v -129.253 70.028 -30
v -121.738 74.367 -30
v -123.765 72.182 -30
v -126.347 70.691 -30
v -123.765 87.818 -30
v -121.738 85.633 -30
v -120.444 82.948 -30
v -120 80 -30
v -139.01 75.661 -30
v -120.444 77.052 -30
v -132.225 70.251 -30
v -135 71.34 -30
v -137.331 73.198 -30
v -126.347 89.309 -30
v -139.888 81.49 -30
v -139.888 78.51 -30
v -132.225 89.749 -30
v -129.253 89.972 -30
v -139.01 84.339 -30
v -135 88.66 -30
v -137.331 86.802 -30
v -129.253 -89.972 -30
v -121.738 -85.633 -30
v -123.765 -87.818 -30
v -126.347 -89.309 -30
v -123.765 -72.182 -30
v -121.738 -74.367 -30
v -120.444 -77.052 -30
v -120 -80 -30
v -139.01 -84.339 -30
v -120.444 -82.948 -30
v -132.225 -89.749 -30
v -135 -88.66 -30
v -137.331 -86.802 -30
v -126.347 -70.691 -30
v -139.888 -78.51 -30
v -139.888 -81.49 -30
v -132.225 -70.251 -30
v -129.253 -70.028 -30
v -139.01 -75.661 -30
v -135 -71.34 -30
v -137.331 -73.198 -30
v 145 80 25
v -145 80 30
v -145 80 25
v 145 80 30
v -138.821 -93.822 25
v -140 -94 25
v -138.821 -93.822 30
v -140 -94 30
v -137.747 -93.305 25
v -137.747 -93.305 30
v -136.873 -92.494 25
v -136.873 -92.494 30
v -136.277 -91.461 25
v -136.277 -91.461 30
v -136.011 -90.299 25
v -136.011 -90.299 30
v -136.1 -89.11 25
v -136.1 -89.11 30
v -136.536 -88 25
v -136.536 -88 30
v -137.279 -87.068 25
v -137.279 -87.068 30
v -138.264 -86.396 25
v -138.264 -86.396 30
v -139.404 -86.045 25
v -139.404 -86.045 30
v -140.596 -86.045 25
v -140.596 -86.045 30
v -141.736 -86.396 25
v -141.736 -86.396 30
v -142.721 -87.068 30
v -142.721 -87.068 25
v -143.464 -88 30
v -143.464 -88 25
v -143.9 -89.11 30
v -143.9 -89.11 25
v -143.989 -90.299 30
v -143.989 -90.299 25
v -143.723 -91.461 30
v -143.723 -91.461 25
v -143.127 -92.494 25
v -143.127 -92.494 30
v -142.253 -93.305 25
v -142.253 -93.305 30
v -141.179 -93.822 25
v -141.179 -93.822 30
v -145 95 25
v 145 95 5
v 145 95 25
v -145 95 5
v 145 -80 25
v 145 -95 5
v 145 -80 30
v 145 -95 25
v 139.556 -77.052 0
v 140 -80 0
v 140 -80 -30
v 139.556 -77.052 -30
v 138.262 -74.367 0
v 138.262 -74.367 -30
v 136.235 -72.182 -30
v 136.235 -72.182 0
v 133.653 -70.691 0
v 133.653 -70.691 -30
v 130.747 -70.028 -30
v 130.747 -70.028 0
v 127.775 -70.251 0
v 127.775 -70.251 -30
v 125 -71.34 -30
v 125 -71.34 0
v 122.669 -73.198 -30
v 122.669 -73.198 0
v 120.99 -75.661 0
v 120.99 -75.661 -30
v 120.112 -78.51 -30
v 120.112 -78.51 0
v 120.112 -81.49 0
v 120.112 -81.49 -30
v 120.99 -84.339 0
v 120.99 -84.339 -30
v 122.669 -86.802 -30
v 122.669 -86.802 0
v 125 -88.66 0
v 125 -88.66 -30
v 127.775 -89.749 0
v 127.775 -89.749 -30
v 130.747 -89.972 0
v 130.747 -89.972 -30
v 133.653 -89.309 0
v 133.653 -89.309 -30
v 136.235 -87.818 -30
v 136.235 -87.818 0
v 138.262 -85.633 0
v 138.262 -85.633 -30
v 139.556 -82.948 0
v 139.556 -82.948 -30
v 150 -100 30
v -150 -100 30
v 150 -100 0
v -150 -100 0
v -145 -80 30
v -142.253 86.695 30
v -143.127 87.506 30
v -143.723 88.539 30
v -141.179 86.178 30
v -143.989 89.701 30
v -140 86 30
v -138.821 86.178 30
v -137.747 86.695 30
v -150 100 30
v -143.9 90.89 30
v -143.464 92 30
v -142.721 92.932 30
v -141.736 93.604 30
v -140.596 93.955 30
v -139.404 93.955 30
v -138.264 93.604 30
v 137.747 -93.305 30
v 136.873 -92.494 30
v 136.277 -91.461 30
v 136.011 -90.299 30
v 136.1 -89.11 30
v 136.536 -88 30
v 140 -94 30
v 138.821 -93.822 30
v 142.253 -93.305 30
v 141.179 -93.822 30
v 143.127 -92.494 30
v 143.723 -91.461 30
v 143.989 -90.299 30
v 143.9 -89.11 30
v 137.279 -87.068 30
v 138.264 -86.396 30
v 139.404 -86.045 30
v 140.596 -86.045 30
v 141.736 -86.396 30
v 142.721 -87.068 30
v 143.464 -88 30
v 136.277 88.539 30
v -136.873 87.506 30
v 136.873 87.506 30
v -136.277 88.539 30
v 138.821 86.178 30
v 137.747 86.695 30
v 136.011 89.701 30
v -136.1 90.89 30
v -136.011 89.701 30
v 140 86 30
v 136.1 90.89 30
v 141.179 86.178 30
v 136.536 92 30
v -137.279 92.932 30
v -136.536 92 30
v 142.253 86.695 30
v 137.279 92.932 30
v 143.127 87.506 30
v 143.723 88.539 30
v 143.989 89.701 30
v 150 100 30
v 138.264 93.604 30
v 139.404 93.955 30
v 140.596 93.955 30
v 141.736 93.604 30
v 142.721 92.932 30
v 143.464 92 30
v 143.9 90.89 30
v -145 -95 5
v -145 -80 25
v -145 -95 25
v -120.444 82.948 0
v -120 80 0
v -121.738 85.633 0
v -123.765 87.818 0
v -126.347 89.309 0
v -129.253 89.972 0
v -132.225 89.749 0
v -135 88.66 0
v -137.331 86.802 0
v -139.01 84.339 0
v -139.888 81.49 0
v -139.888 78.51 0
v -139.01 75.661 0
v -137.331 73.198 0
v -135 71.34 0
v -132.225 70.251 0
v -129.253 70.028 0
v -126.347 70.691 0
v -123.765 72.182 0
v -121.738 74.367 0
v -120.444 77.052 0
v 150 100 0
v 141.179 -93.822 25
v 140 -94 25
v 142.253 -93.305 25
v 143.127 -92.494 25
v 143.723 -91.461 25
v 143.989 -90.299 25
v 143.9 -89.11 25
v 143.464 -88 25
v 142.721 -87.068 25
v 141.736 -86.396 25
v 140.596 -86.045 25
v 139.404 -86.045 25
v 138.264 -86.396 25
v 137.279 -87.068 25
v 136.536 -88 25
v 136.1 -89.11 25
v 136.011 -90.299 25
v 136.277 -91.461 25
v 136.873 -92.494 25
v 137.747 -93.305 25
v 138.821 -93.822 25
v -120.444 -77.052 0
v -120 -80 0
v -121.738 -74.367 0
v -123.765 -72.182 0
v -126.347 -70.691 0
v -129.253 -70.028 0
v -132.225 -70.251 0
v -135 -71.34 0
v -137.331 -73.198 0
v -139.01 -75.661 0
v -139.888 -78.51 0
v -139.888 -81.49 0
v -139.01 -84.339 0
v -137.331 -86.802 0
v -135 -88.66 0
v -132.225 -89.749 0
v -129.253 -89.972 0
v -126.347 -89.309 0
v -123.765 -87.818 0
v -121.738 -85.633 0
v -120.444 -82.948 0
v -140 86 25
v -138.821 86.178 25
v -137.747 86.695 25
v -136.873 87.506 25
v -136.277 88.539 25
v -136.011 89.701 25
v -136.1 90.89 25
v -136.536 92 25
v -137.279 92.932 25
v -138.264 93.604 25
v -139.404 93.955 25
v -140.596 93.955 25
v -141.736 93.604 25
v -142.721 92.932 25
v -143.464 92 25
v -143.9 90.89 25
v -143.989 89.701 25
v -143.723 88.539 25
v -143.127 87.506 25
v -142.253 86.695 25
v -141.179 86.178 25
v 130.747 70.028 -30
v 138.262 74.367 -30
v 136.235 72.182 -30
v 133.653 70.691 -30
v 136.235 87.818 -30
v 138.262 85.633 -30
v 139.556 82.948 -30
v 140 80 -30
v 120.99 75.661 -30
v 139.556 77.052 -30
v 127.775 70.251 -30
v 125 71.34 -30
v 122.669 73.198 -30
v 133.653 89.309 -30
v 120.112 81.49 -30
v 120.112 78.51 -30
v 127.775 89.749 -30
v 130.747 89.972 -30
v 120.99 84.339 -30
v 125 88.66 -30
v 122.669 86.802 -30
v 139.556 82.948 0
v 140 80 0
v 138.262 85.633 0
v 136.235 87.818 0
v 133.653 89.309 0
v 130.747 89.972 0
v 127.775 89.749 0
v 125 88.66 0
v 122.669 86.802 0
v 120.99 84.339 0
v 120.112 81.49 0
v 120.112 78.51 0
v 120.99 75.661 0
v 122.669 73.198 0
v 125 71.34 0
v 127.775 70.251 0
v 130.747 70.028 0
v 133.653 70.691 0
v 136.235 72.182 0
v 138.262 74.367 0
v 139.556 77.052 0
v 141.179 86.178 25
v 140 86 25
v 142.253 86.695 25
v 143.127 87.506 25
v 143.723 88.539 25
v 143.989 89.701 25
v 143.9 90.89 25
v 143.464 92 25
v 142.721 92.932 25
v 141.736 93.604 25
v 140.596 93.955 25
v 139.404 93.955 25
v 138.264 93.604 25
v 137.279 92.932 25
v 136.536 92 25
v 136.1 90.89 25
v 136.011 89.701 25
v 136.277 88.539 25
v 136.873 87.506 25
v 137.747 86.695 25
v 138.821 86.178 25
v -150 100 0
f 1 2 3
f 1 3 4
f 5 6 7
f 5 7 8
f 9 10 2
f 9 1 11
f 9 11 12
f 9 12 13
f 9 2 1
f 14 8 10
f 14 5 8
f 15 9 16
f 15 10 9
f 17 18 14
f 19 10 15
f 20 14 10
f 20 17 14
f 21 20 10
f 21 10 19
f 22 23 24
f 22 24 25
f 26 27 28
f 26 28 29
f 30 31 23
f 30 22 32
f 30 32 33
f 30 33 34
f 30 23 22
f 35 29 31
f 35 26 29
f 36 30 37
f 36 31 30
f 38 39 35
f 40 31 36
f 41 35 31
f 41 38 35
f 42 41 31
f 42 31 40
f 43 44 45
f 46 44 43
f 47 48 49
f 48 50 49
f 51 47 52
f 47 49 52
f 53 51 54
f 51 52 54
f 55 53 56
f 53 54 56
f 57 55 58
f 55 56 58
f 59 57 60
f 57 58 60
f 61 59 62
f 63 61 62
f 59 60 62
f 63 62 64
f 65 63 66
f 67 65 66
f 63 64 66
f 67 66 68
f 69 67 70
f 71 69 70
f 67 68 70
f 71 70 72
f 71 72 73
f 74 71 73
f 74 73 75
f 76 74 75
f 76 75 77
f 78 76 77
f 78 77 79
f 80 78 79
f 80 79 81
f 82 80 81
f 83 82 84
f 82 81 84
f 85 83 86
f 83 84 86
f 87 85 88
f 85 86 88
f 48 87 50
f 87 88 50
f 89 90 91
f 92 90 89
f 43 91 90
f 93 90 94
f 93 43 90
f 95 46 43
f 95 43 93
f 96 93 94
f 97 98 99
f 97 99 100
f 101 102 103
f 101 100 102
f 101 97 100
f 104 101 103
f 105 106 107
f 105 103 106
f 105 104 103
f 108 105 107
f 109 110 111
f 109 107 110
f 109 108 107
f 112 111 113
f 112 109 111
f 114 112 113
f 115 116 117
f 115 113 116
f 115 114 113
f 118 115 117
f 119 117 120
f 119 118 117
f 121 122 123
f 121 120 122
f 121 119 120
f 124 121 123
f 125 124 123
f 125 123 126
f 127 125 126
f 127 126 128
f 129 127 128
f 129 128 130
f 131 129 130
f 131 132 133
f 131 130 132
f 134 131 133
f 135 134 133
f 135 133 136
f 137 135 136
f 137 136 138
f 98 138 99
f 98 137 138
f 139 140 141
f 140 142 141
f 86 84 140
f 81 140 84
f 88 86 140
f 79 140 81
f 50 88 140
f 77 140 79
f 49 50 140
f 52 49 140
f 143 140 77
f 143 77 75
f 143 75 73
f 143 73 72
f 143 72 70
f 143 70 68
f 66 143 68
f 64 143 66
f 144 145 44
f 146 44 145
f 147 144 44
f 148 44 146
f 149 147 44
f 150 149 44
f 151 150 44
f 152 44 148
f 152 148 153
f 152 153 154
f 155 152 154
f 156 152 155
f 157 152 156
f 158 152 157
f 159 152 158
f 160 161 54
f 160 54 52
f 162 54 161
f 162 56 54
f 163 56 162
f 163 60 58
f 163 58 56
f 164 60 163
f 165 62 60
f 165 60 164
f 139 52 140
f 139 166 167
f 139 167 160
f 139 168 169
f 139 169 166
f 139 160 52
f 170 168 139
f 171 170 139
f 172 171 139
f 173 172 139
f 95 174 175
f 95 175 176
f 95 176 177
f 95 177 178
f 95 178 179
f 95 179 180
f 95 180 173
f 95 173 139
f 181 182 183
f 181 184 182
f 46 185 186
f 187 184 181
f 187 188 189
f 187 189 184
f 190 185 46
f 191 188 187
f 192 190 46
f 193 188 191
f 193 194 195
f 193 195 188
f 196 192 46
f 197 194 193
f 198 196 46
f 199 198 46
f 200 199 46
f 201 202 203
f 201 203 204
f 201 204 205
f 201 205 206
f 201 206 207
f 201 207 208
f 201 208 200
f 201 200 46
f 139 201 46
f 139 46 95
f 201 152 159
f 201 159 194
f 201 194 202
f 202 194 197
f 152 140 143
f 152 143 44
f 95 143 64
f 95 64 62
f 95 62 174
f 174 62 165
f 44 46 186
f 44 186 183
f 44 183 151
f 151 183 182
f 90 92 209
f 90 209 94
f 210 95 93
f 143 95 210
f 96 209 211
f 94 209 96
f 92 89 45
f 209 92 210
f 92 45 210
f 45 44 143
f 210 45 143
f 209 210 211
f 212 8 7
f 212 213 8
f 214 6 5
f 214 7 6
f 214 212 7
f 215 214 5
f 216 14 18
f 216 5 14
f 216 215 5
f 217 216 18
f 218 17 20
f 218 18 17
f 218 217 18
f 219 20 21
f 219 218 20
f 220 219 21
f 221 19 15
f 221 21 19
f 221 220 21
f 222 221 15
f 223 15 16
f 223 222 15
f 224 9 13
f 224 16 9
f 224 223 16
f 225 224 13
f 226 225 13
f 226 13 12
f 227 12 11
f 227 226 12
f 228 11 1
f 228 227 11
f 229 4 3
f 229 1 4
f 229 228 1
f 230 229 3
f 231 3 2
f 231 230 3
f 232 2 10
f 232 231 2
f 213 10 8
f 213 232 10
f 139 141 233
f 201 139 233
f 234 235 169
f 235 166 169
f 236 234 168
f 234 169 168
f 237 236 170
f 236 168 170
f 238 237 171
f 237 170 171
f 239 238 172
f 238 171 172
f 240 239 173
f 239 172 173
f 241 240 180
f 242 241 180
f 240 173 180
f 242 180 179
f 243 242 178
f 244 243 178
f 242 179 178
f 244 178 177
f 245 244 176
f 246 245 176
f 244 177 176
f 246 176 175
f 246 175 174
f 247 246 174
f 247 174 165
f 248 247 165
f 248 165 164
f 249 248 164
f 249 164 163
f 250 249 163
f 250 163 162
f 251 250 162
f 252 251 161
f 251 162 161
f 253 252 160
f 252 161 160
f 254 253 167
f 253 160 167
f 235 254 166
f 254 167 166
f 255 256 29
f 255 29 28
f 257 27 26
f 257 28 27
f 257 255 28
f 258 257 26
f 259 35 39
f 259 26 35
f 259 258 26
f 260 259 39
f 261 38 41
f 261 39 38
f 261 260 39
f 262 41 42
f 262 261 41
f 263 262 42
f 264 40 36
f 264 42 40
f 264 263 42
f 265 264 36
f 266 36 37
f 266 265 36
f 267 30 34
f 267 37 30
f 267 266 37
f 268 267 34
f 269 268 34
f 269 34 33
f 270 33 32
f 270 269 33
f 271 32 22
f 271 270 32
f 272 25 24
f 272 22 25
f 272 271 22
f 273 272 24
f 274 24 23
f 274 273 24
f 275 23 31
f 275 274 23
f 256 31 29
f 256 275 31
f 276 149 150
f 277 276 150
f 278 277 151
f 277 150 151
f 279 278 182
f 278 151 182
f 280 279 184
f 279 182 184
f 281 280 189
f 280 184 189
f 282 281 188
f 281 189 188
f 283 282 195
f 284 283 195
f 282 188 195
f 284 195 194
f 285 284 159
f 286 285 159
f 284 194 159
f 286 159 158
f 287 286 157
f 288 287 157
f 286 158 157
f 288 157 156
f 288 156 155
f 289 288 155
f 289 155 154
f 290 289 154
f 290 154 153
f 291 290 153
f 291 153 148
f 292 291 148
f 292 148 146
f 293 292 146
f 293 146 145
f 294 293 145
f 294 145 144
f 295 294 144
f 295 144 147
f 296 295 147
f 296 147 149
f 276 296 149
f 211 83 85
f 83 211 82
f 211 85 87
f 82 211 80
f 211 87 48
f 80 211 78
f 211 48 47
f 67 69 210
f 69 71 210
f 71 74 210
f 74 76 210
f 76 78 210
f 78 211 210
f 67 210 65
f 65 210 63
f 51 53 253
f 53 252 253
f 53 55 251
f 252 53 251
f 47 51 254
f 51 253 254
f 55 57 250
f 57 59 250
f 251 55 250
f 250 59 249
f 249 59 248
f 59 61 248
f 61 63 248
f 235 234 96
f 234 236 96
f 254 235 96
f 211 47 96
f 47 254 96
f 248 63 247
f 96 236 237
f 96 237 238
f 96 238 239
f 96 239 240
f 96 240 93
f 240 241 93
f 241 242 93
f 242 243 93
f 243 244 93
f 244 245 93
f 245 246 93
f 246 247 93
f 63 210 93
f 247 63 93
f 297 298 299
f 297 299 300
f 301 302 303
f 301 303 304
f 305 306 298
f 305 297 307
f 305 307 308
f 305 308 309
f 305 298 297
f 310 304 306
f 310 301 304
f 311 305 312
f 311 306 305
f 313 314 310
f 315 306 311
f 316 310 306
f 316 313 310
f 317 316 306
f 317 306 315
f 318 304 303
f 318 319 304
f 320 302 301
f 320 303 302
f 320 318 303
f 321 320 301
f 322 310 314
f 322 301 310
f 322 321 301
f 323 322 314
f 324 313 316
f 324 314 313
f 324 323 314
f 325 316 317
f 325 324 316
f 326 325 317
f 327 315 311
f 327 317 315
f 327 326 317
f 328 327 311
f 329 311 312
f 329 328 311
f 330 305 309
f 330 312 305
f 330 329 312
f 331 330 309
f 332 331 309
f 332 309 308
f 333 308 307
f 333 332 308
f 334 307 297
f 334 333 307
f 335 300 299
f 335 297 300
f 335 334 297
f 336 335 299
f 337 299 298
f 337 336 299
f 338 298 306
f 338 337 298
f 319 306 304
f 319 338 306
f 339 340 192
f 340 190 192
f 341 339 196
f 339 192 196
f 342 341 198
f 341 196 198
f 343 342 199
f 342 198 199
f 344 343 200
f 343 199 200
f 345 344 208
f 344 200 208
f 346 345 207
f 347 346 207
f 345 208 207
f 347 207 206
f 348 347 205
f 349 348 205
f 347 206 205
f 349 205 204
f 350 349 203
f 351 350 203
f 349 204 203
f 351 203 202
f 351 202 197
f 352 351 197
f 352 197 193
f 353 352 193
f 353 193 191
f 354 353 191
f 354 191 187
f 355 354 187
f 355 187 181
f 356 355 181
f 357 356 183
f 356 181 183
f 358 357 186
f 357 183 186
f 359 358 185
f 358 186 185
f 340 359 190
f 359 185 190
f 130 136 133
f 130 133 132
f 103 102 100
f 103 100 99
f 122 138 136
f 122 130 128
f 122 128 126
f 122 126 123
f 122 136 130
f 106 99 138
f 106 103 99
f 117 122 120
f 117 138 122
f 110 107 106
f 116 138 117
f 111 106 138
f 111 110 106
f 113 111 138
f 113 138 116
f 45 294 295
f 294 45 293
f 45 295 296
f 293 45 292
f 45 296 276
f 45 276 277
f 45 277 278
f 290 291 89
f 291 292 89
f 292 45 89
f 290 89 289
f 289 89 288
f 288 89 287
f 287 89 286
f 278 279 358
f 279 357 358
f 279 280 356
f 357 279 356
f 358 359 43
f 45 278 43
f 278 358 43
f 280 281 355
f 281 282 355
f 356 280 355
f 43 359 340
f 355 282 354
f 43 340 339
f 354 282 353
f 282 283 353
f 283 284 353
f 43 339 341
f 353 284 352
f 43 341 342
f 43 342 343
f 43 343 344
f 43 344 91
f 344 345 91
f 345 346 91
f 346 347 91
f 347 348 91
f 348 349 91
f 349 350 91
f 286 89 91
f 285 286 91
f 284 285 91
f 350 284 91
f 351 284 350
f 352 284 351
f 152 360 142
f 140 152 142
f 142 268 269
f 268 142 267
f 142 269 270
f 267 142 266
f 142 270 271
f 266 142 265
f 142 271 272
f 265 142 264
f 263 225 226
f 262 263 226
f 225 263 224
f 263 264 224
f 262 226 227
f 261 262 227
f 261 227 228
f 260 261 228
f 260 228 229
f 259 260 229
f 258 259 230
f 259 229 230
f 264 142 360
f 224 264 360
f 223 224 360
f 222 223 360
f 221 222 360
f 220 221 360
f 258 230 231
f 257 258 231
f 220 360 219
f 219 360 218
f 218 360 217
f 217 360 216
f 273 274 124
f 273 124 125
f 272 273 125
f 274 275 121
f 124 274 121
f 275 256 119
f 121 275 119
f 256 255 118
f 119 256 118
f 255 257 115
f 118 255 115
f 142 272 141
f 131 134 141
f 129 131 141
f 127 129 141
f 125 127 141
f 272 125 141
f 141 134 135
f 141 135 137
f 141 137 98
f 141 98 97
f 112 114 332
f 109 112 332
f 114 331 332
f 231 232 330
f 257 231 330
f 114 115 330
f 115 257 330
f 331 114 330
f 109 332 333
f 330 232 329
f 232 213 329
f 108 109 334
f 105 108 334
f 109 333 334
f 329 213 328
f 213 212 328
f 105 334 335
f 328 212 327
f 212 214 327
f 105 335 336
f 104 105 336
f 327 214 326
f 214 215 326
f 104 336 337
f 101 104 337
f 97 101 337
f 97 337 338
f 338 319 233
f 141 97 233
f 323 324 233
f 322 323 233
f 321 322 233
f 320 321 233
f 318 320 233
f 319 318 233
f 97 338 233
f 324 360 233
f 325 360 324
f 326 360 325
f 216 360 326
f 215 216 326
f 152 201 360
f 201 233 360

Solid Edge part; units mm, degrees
sketch "Sketch1" plane through (0, 0, 0) normal (0, 0, 1) x (1, 0, 0)
  line L0 (-150, -100) -> (150, -100)
  line L1 (150, -100) -> (150, 100)
  line L2 (150, 100) -> (-150, 100)
  line L3 (-150, 100) -> (-150, -100)
  dimension "D1" = 300
  dimension "D2" = 200
extrude "Protrusion1" add sketch "Sketch1" along normal blind 5
sketch "Sketch2" plane through (0, 0, 0) normal (0, 0, -1) x (1, 0, 0)
  circle A0 centre (-130, 80) radius 10
  circle A1 centre (130, 80) radius 10
  circle A2 centre (130, -80) radius 10
  circle A3 centre (-130, -80) radius 10
  dimension "D1" = 20
  dimension "D2" = 20
  dimension "D3" = 20
  dimension "D4" = 20
  dimension "D5" = 20
  dimension "D6" = 20
  dimension "D7" = 20
  dimension "D8" = 20
extrude "ExtrudedProtrusion_2" add sketch "Sketch2" along normal blind 30
sketch "Sketch3" plane through (0, 0, 5) normal (0, 0, 1) x (1, 0, 0)
  line L0 (-150, -100) -> (150, -100)
  line L1 (150, -100) -> (150, 100)
  line L2 (150, 100) -> (-150, 100)
  line L3 (-150, 100) -> (-150, -100)
  line L4 (145, 95) -> (-145, 95)
  line L5 (-145, 95) -> (-145, -95)
  line L6 (-145, -95) -> (145, -95)
  line L7 (145, -95) -> (145, 95)
extrude "ExtrudedProtrusion_3" add sketch "Sketch3" along normal blind 25
sketch "Sketch4" plane through (0, 0, 30) normal (0, 0, 1) x (1, 0, 0)
  line L0 (-145, 80) -> (-145, -80)
  line L1 (145, -80) -> (-145, -80)
  line L2 (145, 80) -> (145, -80)
  line L3 (-145, 80) -> (145, 80)
  line L4 (-150, -100) -> (150, -100)
  line L5 (150, -100) -> (150, 100)
  line L6 (150, 100) -> (-150, 100)
  line L7 (-150, 100) -> (-150, -100)
extrude "ExtrudedProtrusion_5" add sketch "Sketch4" against normal blind 5
hole "Hole_1" at (140, 90, 30) direction (0, 0, -1) diameter 8 end up to next thread major 10 thread length 5
hole "Hole1" at (-140, -90, 30) direction (0, 0, -1) diameter 8 end up to next thread major 10 thread length 5
hole "Hole2" at (-140, 90, 30) direction (0, 0, -1) diameter 8 end up to next thread major 10 thread length 5
hole "Hole3" at (140, -90, 30) direction (0, 0, -1) diameter 8 end up to next thread major 10 thread length 5
